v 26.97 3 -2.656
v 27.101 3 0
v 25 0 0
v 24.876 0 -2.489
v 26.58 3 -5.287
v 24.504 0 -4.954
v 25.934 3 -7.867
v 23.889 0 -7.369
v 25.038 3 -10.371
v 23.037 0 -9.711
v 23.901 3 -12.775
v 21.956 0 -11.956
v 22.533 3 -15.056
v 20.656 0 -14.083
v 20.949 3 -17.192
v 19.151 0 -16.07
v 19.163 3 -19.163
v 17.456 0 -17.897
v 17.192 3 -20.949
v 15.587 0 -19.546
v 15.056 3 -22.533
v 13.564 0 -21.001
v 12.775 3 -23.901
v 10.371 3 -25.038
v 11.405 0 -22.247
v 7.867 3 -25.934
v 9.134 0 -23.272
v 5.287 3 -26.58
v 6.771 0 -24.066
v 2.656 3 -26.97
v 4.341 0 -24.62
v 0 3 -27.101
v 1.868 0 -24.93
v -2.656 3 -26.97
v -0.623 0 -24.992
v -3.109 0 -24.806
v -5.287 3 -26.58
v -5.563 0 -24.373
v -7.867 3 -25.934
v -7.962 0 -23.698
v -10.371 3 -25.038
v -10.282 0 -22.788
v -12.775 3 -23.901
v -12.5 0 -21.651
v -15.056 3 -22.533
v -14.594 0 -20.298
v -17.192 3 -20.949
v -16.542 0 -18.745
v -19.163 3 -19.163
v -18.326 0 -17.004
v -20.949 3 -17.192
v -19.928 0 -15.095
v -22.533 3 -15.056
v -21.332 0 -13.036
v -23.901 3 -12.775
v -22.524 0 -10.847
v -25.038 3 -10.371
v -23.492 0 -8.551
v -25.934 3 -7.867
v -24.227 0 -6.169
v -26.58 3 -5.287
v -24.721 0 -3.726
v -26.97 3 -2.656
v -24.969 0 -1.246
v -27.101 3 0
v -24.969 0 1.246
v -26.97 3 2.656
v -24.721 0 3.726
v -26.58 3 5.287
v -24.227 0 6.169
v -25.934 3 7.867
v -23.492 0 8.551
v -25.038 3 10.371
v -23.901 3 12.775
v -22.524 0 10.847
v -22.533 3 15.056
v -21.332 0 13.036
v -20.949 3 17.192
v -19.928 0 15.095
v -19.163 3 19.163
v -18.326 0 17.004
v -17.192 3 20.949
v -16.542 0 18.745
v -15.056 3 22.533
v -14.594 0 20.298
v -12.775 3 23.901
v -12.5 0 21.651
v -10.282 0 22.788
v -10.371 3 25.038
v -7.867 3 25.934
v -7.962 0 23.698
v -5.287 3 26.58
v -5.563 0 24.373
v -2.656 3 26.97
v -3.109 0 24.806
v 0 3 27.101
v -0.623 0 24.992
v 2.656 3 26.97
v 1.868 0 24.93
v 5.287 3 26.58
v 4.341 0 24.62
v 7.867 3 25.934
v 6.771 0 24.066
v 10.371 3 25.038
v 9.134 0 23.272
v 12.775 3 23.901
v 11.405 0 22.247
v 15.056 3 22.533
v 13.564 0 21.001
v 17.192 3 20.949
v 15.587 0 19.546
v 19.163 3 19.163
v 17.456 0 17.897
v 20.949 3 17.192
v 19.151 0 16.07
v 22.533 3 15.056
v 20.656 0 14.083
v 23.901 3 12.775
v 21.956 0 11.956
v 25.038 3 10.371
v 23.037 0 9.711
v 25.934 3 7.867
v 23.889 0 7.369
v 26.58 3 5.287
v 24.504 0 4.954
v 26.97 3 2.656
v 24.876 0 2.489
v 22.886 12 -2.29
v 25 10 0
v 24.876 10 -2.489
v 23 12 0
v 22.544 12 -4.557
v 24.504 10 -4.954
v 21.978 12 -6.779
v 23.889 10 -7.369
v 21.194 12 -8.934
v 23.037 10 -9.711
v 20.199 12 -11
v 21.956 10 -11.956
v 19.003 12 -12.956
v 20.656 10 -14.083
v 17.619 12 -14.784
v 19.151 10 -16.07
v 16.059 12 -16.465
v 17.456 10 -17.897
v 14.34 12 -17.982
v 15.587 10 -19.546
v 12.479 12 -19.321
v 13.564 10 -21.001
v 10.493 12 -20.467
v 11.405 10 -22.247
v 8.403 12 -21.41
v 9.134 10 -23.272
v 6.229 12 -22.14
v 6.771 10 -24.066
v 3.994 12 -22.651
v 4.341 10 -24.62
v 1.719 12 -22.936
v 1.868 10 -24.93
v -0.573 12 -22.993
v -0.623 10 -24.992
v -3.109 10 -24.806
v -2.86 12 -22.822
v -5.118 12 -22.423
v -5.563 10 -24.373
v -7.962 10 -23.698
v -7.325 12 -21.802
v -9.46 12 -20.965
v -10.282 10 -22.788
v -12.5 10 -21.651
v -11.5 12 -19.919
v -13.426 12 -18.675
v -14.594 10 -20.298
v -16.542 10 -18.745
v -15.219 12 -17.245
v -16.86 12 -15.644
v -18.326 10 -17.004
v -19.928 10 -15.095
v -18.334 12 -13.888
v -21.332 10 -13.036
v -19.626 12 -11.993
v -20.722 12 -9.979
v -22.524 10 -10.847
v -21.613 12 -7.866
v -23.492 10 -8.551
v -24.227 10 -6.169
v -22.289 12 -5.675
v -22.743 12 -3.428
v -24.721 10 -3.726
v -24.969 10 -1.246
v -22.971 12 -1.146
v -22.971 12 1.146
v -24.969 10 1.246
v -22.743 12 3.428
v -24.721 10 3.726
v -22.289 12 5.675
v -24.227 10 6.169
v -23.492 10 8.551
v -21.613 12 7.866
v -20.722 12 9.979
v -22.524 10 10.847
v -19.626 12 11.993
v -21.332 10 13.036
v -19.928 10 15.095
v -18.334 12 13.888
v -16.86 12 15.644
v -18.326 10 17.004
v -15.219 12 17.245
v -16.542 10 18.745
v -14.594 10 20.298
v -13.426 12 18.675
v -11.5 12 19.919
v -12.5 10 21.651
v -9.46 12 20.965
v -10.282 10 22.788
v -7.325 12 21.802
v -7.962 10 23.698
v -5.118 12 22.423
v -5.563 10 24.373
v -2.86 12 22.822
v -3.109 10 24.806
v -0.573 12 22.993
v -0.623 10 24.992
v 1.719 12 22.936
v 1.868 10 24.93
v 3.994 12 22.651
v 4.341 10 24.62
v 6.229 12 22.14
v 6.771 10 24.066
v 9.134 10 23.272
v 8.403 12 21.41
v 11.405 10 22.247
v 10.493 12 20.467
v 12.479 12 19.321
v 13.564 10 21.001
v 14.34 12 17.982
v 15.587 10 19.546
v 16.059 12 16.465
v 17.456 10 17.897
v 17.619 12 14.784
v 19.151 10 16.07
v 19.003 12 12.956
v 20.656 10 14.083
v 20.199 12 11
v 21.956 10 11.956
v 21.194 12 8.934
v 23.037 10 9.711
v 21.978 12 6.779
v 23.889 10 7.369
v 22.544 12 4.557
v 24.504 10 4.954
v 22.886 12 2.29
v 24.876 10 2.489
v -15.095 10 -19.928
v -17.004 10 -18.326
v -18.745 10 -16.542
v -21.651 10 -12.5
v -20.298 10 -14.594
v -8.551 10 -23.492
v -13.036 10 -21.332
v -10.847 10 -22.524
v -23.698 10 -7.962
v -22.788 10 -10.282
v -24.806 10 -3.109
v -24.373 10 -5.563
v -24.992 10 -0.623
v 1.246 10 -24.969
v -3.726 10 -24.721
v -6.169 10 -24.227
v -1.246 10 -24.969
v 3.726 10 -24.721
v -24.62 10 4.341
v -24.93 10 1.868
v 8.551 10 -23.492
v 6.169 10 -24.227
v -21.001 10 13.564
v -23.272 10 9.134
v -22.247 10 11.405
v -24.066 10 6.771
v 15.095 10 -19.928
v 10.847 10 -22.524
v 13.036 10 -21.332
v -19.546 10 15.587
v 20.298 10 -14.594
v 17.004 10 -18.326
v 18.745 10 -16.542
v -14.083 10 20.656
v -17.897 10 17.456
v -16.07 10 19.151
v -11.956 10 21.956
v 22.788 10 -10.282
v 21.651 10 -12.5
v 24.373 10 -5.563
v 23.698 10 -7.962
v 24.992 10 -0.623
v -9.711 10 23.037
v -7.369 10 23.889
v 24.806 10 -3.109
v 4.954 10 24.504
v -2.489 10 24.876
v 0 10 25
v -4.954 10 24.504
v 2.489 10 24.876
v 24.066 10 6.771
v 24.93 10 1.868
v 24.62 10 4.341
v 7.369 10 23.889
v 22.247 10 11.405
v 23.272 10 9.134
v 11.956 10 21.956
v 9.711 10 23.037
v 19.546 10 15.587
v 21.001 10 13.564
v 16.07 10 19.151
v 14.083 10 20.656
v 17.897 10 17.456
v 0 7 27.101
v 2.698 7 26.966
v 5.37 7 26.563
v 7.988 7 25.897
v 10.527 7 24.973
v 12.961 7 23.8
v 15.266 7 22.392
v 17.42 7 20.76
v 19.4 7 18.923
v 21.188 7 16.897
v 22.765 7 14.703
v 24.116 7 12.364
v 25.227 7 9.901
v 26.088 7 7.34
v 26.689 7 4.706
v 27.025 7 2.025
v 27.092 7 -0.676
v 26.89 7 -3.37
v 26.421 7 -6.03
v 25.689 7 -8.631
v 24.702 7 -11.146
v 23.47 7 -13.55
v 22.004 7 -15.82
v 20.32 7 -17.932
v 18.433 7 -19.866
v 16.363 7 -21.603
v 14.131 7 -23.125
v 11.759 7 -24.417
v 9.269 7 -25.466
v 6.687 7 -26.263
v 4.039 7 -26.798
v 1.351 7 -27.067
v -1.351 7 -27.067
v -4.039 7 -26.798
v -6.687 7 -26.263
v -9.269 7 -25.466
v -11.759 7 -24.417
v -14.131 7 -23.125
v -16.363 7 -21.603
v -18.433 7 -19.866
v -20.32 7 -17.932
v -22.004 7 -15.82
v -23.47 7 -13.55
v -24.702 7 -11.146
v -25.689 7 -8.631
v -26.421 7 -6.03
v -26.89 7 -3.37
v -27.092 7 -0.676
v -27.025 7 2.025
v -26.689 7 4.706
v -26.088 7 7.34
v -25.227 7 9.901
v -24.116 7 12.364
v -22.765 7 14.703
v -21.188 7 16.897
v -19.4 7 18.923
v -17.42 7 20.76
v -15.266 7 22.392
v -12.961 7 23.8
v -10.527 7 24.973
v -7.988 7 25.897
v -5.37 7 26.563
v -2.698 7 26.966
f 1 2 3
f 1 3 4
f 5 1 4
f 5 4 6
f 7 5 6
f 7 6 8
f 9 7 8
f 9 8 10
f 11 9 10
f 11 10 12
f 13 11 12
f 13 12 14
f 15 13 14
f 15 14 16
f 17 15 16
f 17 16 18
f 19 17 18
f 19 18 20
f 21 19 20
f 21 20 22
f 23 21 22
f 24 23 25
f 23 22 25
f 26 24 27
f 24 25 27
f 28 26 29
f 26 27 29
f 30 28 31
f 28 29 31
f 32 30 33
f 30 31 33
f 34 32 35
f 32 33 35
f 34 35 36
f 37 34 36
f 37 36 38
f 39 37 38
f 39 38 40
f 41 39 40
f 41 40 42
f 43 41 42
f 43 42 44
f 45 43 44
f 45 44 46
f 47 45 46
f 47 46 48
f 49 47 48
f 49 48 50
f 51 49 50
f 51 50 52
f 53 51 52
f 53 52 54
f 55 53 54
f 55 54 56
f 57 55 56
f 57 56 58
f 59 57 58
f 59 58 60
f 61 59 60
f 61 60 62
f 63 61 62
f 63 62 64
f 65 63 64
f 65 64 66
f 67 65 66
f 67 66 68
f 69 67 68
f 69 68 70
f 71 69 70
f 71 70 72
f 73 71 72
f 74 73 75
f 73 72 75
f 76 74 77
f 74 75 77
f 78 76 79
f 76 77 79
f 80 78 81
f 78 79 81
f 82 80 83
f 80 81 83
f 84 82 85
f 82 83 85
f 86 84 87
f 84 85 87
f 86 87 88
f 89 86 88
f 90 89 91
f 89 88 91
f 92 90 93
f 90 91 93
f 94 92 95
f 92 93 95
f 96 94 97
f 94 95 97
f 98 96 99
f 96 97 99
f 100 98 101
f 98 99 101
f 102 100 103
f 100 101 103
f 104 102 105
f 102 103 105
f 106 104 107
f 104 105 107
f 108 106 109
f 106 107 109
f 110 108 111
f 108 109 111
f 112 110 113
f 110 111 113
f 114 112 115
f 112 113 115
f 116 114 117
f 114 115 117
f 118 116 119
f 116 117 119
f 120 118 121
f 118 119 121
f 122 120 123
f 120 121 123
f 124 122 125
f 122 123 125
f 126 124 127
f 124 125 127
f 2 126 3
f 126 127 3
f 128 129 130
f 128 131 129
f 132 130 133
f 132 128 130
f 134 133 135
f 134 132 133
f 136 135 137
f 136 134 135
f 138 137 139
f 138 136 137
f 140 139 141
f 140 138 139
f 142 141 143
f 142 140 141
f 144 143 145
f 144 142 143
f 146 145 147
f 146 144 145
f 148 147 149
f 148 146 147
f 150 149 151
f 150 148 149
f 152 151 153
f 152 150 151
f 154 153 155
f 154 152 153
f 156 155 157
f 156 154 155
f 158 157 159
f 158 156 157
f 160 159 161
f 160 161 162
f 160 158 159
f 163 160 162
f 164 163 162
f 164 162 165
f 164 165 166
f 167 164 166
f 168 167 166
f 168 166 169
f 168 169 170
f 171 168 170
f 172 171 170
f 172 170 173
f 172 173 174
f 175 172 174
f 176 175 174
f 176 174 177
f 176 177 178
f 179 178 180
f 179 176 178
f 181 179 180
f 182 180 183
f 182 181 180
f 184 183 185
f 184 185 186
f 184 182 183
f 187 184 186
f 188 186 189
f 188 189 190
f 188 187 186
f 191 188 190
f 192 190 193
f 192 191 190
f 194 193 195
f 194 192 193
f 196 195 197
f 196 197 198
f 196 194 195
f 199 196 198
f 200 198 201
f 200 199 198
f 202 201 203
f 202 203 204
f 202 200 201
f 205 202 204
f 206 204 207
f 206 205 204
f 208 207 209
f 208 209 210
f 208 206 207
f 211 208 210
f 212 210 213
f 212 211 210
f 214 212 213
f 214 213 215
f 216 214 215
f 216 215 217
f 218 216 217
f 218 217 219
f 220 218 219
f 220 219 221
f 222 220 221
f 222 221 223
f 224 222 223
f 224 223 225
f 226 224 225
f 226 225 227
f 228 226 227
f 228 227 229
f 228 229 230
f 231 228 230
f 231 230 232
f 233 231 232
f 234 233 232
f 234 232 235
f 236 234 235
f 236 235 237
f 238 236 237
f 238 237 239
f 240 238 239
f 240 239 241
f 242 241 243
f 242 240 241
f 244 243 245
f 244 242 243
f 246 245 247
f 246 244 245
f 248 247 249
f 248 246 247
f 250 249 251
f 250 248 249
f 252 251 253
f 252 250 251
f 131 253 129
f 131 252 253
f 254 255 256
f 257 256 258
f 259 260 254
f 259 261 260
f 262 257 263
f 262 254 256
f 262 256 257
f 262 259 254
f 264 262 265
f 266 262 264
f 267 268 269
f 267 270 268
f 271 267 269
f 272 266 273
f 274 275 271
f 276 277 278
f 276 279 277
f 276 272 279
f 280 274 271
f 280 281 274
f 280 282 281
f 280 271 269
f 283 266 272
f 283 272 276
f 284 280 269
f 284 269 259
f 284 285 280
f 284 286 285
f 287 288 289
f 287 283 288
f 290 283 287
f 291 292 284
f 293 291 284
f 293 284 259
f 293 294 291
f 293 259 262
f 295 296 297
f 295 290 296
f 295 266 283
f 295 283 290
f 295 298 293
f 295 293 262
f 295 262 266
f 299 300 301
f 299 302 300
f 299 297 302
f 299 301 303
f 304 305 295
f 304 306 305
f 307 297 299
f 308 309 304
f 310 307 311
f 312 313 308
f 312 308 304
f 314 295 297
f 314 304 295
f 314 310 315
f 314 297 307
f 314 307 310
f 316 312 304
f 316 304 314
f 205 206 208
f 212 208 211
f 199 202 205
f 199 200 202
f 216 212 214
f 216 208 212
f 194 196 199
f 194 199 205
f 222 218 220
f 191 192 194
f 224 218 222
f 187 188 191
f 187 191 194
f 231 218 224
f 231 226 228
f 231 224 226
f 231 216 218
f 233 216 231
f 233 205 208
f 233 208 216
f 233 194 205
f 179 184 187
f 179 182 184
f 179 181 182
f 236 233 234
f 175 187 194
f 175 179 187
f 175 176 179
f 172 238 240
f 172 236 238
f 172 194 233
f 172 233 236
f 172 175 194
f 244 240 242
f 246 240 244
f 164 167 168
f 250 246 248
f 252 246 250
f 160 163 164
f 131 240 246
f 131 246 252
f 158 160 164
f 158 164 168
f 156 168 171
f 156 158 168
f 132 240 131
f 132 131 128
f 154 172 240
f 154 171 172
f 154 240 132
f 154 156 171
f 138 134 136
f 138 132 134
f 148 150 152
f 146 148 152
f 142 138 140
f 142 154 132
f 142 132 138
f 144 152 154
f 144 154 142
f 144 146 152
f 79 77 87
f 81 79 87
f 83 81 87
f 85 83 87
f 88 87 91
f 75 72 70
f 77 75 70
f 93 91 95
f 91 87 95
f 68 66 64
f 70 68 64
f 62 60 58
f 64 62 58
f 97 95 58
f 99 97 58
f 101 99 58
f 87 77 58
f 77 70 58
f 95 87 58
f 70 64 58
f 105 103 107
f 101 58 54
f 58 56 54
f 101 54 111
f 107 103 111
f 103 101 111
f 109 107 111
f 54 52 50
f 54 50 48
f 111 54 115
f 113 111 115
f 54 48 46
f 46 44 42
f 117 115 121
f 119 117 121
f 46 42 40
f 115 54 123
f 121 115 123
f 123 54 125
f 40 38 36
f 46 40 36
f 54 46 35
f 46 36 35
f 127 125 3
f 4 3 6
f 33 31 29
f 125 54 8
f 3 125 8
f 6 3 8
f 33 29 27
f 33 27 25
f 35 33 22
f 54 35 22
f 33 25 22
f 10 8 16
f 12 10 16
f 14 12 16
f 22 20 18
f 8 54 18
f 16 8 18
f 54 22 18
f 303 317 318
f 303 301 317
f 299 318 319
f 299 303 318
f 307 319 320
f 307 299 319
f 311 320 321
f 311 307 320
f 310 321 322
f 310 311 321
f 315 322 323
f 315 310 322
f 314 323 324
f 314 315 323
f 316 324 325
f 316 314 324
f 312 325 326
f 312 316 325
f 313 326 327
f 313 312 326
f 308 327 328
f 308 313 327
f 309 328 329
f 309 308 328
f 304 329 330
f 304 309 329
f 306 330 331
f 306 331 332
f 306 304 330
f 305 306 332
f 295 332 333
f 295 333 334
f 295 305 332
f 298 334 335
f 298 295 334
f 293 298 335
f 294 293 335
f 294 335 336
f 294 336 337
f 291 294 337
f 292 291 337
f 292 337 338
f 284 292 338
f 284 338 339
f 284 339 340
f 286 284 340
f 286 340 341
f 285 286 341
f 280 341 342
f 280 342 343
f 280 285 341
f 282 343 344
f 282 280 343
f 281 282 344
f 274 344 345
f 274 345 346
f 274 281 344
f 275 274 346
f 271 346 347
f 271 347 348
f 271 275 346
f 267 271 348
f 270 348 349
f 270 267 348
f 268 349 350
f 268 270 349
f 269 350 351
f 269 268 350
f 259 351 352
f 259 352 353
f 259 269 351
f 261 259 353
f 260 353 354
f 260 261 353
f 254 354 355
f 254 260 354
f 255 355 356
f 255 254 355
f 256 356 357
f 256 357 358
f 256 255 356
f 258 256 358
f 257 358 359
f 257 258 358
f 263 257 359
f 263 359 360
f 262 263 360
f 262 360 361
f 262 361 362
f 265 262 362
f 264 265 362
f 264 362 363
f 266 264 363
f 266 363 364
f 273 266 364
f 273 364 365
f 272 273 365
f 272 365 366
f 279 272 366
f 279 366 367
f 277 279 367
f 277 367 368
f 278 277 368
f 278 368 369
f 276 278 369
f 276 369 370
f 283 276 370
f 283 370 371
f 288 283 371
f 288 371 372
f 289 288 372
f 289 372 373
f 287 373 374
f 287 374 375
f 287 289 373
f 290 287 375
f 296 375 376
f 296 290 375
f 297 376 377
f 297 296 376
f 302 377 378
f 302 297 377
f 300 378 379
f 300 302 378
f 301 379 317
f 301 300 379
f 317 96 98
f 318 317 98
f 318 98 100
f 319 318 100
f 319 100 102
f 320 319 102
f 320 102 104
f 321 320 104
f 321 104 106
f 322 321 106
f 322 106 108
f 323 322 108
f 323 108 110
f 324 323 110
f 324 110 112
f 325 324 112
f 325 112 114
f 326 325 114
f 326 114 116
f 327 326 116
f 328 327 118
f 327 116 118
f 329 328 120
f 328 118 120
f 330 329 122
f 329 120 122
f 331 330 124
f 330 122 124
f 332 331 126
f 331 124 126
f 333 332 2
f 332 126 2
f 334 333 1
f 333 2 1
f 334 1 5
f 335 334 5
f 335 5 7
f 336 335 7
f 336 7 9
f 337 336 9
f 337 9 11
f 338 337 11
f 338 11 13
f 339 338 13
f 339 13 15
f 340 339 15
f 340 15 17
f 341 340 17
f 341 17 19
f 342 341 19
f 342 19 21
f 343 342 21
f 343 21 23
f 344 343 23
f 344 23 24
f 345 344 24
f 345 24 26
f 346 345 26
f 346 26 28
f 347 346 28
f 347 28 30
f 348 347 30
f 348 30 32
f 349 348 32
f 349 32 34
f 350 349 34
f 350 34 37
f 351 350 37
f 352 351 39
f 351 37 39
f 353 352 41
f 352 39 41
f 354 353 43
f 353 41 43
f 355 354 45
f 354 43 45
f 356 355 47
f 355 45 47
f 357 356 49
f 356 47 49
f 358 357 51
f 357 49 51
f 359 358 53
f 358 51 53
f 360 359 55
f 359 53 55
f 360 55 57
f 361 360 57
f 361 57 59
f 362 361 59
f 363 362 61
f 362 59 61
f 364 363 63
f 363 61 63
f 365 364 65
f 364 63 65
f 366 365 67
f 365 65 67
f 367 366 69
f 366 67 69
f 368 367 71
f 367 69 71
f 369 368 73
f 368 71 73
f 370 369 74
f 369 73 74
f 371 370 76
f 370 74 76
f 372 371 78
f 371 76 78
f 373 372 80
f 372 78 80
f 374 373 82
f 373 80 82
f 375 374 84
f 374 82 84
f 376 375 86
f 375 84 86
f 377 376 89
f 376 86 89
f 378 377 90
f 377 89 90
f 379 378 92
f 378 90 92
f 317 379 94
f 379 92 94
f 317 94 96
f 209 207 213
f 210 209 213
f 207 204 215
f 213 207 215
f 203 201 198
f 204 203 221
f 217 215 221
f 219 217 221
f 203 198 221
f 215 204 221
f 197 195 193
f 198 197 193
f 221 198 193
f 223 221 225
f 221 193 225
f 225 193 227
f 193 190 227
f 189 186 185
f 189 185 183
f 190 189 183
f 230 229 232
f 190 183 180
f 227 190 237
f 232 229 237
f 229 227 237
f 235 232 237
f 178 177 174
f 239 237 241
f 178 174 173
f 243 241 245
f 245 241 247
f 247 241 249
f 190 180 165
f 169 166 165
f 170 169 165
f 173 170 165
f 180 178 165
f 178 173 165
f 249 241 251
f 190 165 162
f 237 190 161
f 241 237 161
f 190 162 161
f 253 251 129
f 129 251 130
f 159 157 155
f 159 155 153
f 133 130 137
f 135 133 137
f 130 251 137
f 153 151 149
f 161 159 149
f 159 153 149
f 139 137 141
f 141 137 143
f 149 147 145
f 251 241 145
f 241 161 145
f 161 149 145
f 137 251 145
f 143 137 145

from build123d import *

# Parameters (mm, degrees)
CROQUIS1_R              = 25
SALIENTE_EXTRUIR1_DEPTH = 3
SALIENTE_EXTRUIR1_DRAFT = -35
CROQUIS2_R              = 27.100622615
SALIENTE_EXTRUIR2_DEPTH = 4
CROQUIS3_R              = 27.100622615
SALIENTE_EXTRUIR3_DEPTH = 3
SALIENTE_EXTRUIR3_TAPER = 35
CROQUIS4_R              = 25
SALIENTE_EXTRUIR4_DEPTH = 2
SALIENTE_EXTRUIR4_TAPER = 45


with BuildPart() as part:
    # Croquis1 → Saliente-Extruir1 (with draft: the straight prism first)
    with BuildSketch(Plane(origin=(0, 0, 0), x_dir=(1, 0, 0), z_dir=(0, 1, 0))):
        Circle(CROQUIS1_R)
    extrude(amount=SALIENTE_EXTRUIR1_DEPTH)
    # Saliente-Extruir1: the draft: its side faces are tilted about the plane it starts from
    saliente_extruir1_sides = [part.faces().sort_by_distance(p)[0] for p in [
        (-25, 1.5, 0),
    ]]
    draft(saliente_extruir1_sides, Plane(origin=(0, 0, 0), x_dir=(1, 0, 0), z_dir=(0, 1, 0)), SALIENTE_EXTRUIR1_DRAFT)

    # Croquis2 → Saliente-Extruir2 (add)
    with BuildSketch(Plane(origin=(0, 3, 0), x_dir=(1, 0, 0), z_dir=(0, 1, 0))):
        with Locations(Location((0, 0, 0), (0, 0, 270))):
            Circle(CROQUIS2_R)
    extrude(amount=SALIENTE_EXTRUIR2_DEPTH)

    # Croquis3 → Saliente-Extruir3 (add)
    with BuildSketch(Plane(origin=(0, 7, 0), x_dir=(1, 0, 0), z_dir=(0, 1, 0))):
        with Locations(Location((0, 0, 0), (0, 0, 270))):
            Circle(CROQUIS3_R)
    extrude(amount=SALIENTE_EXTRUIR3_DEPTH, taper=SALIENTE_EXTRUIR3_TAPER)


with BuildPart() as body_2:
    # Croquis4 → Saliente-Extruir4 (new body)
    with BuildSketch(Plane(origin=(0, 10, 0), x_dir=(1, 0, 0), z_dir=(0, 1, 0))):
        Circle(CROQUIS4_R)
    extrude(amount=SALIENTE_EXTRUIR4_DEPTH, taper=SALIENTE_EXTRUIR4_TAPER)


solid = Compound([part.part, body_2.part])
